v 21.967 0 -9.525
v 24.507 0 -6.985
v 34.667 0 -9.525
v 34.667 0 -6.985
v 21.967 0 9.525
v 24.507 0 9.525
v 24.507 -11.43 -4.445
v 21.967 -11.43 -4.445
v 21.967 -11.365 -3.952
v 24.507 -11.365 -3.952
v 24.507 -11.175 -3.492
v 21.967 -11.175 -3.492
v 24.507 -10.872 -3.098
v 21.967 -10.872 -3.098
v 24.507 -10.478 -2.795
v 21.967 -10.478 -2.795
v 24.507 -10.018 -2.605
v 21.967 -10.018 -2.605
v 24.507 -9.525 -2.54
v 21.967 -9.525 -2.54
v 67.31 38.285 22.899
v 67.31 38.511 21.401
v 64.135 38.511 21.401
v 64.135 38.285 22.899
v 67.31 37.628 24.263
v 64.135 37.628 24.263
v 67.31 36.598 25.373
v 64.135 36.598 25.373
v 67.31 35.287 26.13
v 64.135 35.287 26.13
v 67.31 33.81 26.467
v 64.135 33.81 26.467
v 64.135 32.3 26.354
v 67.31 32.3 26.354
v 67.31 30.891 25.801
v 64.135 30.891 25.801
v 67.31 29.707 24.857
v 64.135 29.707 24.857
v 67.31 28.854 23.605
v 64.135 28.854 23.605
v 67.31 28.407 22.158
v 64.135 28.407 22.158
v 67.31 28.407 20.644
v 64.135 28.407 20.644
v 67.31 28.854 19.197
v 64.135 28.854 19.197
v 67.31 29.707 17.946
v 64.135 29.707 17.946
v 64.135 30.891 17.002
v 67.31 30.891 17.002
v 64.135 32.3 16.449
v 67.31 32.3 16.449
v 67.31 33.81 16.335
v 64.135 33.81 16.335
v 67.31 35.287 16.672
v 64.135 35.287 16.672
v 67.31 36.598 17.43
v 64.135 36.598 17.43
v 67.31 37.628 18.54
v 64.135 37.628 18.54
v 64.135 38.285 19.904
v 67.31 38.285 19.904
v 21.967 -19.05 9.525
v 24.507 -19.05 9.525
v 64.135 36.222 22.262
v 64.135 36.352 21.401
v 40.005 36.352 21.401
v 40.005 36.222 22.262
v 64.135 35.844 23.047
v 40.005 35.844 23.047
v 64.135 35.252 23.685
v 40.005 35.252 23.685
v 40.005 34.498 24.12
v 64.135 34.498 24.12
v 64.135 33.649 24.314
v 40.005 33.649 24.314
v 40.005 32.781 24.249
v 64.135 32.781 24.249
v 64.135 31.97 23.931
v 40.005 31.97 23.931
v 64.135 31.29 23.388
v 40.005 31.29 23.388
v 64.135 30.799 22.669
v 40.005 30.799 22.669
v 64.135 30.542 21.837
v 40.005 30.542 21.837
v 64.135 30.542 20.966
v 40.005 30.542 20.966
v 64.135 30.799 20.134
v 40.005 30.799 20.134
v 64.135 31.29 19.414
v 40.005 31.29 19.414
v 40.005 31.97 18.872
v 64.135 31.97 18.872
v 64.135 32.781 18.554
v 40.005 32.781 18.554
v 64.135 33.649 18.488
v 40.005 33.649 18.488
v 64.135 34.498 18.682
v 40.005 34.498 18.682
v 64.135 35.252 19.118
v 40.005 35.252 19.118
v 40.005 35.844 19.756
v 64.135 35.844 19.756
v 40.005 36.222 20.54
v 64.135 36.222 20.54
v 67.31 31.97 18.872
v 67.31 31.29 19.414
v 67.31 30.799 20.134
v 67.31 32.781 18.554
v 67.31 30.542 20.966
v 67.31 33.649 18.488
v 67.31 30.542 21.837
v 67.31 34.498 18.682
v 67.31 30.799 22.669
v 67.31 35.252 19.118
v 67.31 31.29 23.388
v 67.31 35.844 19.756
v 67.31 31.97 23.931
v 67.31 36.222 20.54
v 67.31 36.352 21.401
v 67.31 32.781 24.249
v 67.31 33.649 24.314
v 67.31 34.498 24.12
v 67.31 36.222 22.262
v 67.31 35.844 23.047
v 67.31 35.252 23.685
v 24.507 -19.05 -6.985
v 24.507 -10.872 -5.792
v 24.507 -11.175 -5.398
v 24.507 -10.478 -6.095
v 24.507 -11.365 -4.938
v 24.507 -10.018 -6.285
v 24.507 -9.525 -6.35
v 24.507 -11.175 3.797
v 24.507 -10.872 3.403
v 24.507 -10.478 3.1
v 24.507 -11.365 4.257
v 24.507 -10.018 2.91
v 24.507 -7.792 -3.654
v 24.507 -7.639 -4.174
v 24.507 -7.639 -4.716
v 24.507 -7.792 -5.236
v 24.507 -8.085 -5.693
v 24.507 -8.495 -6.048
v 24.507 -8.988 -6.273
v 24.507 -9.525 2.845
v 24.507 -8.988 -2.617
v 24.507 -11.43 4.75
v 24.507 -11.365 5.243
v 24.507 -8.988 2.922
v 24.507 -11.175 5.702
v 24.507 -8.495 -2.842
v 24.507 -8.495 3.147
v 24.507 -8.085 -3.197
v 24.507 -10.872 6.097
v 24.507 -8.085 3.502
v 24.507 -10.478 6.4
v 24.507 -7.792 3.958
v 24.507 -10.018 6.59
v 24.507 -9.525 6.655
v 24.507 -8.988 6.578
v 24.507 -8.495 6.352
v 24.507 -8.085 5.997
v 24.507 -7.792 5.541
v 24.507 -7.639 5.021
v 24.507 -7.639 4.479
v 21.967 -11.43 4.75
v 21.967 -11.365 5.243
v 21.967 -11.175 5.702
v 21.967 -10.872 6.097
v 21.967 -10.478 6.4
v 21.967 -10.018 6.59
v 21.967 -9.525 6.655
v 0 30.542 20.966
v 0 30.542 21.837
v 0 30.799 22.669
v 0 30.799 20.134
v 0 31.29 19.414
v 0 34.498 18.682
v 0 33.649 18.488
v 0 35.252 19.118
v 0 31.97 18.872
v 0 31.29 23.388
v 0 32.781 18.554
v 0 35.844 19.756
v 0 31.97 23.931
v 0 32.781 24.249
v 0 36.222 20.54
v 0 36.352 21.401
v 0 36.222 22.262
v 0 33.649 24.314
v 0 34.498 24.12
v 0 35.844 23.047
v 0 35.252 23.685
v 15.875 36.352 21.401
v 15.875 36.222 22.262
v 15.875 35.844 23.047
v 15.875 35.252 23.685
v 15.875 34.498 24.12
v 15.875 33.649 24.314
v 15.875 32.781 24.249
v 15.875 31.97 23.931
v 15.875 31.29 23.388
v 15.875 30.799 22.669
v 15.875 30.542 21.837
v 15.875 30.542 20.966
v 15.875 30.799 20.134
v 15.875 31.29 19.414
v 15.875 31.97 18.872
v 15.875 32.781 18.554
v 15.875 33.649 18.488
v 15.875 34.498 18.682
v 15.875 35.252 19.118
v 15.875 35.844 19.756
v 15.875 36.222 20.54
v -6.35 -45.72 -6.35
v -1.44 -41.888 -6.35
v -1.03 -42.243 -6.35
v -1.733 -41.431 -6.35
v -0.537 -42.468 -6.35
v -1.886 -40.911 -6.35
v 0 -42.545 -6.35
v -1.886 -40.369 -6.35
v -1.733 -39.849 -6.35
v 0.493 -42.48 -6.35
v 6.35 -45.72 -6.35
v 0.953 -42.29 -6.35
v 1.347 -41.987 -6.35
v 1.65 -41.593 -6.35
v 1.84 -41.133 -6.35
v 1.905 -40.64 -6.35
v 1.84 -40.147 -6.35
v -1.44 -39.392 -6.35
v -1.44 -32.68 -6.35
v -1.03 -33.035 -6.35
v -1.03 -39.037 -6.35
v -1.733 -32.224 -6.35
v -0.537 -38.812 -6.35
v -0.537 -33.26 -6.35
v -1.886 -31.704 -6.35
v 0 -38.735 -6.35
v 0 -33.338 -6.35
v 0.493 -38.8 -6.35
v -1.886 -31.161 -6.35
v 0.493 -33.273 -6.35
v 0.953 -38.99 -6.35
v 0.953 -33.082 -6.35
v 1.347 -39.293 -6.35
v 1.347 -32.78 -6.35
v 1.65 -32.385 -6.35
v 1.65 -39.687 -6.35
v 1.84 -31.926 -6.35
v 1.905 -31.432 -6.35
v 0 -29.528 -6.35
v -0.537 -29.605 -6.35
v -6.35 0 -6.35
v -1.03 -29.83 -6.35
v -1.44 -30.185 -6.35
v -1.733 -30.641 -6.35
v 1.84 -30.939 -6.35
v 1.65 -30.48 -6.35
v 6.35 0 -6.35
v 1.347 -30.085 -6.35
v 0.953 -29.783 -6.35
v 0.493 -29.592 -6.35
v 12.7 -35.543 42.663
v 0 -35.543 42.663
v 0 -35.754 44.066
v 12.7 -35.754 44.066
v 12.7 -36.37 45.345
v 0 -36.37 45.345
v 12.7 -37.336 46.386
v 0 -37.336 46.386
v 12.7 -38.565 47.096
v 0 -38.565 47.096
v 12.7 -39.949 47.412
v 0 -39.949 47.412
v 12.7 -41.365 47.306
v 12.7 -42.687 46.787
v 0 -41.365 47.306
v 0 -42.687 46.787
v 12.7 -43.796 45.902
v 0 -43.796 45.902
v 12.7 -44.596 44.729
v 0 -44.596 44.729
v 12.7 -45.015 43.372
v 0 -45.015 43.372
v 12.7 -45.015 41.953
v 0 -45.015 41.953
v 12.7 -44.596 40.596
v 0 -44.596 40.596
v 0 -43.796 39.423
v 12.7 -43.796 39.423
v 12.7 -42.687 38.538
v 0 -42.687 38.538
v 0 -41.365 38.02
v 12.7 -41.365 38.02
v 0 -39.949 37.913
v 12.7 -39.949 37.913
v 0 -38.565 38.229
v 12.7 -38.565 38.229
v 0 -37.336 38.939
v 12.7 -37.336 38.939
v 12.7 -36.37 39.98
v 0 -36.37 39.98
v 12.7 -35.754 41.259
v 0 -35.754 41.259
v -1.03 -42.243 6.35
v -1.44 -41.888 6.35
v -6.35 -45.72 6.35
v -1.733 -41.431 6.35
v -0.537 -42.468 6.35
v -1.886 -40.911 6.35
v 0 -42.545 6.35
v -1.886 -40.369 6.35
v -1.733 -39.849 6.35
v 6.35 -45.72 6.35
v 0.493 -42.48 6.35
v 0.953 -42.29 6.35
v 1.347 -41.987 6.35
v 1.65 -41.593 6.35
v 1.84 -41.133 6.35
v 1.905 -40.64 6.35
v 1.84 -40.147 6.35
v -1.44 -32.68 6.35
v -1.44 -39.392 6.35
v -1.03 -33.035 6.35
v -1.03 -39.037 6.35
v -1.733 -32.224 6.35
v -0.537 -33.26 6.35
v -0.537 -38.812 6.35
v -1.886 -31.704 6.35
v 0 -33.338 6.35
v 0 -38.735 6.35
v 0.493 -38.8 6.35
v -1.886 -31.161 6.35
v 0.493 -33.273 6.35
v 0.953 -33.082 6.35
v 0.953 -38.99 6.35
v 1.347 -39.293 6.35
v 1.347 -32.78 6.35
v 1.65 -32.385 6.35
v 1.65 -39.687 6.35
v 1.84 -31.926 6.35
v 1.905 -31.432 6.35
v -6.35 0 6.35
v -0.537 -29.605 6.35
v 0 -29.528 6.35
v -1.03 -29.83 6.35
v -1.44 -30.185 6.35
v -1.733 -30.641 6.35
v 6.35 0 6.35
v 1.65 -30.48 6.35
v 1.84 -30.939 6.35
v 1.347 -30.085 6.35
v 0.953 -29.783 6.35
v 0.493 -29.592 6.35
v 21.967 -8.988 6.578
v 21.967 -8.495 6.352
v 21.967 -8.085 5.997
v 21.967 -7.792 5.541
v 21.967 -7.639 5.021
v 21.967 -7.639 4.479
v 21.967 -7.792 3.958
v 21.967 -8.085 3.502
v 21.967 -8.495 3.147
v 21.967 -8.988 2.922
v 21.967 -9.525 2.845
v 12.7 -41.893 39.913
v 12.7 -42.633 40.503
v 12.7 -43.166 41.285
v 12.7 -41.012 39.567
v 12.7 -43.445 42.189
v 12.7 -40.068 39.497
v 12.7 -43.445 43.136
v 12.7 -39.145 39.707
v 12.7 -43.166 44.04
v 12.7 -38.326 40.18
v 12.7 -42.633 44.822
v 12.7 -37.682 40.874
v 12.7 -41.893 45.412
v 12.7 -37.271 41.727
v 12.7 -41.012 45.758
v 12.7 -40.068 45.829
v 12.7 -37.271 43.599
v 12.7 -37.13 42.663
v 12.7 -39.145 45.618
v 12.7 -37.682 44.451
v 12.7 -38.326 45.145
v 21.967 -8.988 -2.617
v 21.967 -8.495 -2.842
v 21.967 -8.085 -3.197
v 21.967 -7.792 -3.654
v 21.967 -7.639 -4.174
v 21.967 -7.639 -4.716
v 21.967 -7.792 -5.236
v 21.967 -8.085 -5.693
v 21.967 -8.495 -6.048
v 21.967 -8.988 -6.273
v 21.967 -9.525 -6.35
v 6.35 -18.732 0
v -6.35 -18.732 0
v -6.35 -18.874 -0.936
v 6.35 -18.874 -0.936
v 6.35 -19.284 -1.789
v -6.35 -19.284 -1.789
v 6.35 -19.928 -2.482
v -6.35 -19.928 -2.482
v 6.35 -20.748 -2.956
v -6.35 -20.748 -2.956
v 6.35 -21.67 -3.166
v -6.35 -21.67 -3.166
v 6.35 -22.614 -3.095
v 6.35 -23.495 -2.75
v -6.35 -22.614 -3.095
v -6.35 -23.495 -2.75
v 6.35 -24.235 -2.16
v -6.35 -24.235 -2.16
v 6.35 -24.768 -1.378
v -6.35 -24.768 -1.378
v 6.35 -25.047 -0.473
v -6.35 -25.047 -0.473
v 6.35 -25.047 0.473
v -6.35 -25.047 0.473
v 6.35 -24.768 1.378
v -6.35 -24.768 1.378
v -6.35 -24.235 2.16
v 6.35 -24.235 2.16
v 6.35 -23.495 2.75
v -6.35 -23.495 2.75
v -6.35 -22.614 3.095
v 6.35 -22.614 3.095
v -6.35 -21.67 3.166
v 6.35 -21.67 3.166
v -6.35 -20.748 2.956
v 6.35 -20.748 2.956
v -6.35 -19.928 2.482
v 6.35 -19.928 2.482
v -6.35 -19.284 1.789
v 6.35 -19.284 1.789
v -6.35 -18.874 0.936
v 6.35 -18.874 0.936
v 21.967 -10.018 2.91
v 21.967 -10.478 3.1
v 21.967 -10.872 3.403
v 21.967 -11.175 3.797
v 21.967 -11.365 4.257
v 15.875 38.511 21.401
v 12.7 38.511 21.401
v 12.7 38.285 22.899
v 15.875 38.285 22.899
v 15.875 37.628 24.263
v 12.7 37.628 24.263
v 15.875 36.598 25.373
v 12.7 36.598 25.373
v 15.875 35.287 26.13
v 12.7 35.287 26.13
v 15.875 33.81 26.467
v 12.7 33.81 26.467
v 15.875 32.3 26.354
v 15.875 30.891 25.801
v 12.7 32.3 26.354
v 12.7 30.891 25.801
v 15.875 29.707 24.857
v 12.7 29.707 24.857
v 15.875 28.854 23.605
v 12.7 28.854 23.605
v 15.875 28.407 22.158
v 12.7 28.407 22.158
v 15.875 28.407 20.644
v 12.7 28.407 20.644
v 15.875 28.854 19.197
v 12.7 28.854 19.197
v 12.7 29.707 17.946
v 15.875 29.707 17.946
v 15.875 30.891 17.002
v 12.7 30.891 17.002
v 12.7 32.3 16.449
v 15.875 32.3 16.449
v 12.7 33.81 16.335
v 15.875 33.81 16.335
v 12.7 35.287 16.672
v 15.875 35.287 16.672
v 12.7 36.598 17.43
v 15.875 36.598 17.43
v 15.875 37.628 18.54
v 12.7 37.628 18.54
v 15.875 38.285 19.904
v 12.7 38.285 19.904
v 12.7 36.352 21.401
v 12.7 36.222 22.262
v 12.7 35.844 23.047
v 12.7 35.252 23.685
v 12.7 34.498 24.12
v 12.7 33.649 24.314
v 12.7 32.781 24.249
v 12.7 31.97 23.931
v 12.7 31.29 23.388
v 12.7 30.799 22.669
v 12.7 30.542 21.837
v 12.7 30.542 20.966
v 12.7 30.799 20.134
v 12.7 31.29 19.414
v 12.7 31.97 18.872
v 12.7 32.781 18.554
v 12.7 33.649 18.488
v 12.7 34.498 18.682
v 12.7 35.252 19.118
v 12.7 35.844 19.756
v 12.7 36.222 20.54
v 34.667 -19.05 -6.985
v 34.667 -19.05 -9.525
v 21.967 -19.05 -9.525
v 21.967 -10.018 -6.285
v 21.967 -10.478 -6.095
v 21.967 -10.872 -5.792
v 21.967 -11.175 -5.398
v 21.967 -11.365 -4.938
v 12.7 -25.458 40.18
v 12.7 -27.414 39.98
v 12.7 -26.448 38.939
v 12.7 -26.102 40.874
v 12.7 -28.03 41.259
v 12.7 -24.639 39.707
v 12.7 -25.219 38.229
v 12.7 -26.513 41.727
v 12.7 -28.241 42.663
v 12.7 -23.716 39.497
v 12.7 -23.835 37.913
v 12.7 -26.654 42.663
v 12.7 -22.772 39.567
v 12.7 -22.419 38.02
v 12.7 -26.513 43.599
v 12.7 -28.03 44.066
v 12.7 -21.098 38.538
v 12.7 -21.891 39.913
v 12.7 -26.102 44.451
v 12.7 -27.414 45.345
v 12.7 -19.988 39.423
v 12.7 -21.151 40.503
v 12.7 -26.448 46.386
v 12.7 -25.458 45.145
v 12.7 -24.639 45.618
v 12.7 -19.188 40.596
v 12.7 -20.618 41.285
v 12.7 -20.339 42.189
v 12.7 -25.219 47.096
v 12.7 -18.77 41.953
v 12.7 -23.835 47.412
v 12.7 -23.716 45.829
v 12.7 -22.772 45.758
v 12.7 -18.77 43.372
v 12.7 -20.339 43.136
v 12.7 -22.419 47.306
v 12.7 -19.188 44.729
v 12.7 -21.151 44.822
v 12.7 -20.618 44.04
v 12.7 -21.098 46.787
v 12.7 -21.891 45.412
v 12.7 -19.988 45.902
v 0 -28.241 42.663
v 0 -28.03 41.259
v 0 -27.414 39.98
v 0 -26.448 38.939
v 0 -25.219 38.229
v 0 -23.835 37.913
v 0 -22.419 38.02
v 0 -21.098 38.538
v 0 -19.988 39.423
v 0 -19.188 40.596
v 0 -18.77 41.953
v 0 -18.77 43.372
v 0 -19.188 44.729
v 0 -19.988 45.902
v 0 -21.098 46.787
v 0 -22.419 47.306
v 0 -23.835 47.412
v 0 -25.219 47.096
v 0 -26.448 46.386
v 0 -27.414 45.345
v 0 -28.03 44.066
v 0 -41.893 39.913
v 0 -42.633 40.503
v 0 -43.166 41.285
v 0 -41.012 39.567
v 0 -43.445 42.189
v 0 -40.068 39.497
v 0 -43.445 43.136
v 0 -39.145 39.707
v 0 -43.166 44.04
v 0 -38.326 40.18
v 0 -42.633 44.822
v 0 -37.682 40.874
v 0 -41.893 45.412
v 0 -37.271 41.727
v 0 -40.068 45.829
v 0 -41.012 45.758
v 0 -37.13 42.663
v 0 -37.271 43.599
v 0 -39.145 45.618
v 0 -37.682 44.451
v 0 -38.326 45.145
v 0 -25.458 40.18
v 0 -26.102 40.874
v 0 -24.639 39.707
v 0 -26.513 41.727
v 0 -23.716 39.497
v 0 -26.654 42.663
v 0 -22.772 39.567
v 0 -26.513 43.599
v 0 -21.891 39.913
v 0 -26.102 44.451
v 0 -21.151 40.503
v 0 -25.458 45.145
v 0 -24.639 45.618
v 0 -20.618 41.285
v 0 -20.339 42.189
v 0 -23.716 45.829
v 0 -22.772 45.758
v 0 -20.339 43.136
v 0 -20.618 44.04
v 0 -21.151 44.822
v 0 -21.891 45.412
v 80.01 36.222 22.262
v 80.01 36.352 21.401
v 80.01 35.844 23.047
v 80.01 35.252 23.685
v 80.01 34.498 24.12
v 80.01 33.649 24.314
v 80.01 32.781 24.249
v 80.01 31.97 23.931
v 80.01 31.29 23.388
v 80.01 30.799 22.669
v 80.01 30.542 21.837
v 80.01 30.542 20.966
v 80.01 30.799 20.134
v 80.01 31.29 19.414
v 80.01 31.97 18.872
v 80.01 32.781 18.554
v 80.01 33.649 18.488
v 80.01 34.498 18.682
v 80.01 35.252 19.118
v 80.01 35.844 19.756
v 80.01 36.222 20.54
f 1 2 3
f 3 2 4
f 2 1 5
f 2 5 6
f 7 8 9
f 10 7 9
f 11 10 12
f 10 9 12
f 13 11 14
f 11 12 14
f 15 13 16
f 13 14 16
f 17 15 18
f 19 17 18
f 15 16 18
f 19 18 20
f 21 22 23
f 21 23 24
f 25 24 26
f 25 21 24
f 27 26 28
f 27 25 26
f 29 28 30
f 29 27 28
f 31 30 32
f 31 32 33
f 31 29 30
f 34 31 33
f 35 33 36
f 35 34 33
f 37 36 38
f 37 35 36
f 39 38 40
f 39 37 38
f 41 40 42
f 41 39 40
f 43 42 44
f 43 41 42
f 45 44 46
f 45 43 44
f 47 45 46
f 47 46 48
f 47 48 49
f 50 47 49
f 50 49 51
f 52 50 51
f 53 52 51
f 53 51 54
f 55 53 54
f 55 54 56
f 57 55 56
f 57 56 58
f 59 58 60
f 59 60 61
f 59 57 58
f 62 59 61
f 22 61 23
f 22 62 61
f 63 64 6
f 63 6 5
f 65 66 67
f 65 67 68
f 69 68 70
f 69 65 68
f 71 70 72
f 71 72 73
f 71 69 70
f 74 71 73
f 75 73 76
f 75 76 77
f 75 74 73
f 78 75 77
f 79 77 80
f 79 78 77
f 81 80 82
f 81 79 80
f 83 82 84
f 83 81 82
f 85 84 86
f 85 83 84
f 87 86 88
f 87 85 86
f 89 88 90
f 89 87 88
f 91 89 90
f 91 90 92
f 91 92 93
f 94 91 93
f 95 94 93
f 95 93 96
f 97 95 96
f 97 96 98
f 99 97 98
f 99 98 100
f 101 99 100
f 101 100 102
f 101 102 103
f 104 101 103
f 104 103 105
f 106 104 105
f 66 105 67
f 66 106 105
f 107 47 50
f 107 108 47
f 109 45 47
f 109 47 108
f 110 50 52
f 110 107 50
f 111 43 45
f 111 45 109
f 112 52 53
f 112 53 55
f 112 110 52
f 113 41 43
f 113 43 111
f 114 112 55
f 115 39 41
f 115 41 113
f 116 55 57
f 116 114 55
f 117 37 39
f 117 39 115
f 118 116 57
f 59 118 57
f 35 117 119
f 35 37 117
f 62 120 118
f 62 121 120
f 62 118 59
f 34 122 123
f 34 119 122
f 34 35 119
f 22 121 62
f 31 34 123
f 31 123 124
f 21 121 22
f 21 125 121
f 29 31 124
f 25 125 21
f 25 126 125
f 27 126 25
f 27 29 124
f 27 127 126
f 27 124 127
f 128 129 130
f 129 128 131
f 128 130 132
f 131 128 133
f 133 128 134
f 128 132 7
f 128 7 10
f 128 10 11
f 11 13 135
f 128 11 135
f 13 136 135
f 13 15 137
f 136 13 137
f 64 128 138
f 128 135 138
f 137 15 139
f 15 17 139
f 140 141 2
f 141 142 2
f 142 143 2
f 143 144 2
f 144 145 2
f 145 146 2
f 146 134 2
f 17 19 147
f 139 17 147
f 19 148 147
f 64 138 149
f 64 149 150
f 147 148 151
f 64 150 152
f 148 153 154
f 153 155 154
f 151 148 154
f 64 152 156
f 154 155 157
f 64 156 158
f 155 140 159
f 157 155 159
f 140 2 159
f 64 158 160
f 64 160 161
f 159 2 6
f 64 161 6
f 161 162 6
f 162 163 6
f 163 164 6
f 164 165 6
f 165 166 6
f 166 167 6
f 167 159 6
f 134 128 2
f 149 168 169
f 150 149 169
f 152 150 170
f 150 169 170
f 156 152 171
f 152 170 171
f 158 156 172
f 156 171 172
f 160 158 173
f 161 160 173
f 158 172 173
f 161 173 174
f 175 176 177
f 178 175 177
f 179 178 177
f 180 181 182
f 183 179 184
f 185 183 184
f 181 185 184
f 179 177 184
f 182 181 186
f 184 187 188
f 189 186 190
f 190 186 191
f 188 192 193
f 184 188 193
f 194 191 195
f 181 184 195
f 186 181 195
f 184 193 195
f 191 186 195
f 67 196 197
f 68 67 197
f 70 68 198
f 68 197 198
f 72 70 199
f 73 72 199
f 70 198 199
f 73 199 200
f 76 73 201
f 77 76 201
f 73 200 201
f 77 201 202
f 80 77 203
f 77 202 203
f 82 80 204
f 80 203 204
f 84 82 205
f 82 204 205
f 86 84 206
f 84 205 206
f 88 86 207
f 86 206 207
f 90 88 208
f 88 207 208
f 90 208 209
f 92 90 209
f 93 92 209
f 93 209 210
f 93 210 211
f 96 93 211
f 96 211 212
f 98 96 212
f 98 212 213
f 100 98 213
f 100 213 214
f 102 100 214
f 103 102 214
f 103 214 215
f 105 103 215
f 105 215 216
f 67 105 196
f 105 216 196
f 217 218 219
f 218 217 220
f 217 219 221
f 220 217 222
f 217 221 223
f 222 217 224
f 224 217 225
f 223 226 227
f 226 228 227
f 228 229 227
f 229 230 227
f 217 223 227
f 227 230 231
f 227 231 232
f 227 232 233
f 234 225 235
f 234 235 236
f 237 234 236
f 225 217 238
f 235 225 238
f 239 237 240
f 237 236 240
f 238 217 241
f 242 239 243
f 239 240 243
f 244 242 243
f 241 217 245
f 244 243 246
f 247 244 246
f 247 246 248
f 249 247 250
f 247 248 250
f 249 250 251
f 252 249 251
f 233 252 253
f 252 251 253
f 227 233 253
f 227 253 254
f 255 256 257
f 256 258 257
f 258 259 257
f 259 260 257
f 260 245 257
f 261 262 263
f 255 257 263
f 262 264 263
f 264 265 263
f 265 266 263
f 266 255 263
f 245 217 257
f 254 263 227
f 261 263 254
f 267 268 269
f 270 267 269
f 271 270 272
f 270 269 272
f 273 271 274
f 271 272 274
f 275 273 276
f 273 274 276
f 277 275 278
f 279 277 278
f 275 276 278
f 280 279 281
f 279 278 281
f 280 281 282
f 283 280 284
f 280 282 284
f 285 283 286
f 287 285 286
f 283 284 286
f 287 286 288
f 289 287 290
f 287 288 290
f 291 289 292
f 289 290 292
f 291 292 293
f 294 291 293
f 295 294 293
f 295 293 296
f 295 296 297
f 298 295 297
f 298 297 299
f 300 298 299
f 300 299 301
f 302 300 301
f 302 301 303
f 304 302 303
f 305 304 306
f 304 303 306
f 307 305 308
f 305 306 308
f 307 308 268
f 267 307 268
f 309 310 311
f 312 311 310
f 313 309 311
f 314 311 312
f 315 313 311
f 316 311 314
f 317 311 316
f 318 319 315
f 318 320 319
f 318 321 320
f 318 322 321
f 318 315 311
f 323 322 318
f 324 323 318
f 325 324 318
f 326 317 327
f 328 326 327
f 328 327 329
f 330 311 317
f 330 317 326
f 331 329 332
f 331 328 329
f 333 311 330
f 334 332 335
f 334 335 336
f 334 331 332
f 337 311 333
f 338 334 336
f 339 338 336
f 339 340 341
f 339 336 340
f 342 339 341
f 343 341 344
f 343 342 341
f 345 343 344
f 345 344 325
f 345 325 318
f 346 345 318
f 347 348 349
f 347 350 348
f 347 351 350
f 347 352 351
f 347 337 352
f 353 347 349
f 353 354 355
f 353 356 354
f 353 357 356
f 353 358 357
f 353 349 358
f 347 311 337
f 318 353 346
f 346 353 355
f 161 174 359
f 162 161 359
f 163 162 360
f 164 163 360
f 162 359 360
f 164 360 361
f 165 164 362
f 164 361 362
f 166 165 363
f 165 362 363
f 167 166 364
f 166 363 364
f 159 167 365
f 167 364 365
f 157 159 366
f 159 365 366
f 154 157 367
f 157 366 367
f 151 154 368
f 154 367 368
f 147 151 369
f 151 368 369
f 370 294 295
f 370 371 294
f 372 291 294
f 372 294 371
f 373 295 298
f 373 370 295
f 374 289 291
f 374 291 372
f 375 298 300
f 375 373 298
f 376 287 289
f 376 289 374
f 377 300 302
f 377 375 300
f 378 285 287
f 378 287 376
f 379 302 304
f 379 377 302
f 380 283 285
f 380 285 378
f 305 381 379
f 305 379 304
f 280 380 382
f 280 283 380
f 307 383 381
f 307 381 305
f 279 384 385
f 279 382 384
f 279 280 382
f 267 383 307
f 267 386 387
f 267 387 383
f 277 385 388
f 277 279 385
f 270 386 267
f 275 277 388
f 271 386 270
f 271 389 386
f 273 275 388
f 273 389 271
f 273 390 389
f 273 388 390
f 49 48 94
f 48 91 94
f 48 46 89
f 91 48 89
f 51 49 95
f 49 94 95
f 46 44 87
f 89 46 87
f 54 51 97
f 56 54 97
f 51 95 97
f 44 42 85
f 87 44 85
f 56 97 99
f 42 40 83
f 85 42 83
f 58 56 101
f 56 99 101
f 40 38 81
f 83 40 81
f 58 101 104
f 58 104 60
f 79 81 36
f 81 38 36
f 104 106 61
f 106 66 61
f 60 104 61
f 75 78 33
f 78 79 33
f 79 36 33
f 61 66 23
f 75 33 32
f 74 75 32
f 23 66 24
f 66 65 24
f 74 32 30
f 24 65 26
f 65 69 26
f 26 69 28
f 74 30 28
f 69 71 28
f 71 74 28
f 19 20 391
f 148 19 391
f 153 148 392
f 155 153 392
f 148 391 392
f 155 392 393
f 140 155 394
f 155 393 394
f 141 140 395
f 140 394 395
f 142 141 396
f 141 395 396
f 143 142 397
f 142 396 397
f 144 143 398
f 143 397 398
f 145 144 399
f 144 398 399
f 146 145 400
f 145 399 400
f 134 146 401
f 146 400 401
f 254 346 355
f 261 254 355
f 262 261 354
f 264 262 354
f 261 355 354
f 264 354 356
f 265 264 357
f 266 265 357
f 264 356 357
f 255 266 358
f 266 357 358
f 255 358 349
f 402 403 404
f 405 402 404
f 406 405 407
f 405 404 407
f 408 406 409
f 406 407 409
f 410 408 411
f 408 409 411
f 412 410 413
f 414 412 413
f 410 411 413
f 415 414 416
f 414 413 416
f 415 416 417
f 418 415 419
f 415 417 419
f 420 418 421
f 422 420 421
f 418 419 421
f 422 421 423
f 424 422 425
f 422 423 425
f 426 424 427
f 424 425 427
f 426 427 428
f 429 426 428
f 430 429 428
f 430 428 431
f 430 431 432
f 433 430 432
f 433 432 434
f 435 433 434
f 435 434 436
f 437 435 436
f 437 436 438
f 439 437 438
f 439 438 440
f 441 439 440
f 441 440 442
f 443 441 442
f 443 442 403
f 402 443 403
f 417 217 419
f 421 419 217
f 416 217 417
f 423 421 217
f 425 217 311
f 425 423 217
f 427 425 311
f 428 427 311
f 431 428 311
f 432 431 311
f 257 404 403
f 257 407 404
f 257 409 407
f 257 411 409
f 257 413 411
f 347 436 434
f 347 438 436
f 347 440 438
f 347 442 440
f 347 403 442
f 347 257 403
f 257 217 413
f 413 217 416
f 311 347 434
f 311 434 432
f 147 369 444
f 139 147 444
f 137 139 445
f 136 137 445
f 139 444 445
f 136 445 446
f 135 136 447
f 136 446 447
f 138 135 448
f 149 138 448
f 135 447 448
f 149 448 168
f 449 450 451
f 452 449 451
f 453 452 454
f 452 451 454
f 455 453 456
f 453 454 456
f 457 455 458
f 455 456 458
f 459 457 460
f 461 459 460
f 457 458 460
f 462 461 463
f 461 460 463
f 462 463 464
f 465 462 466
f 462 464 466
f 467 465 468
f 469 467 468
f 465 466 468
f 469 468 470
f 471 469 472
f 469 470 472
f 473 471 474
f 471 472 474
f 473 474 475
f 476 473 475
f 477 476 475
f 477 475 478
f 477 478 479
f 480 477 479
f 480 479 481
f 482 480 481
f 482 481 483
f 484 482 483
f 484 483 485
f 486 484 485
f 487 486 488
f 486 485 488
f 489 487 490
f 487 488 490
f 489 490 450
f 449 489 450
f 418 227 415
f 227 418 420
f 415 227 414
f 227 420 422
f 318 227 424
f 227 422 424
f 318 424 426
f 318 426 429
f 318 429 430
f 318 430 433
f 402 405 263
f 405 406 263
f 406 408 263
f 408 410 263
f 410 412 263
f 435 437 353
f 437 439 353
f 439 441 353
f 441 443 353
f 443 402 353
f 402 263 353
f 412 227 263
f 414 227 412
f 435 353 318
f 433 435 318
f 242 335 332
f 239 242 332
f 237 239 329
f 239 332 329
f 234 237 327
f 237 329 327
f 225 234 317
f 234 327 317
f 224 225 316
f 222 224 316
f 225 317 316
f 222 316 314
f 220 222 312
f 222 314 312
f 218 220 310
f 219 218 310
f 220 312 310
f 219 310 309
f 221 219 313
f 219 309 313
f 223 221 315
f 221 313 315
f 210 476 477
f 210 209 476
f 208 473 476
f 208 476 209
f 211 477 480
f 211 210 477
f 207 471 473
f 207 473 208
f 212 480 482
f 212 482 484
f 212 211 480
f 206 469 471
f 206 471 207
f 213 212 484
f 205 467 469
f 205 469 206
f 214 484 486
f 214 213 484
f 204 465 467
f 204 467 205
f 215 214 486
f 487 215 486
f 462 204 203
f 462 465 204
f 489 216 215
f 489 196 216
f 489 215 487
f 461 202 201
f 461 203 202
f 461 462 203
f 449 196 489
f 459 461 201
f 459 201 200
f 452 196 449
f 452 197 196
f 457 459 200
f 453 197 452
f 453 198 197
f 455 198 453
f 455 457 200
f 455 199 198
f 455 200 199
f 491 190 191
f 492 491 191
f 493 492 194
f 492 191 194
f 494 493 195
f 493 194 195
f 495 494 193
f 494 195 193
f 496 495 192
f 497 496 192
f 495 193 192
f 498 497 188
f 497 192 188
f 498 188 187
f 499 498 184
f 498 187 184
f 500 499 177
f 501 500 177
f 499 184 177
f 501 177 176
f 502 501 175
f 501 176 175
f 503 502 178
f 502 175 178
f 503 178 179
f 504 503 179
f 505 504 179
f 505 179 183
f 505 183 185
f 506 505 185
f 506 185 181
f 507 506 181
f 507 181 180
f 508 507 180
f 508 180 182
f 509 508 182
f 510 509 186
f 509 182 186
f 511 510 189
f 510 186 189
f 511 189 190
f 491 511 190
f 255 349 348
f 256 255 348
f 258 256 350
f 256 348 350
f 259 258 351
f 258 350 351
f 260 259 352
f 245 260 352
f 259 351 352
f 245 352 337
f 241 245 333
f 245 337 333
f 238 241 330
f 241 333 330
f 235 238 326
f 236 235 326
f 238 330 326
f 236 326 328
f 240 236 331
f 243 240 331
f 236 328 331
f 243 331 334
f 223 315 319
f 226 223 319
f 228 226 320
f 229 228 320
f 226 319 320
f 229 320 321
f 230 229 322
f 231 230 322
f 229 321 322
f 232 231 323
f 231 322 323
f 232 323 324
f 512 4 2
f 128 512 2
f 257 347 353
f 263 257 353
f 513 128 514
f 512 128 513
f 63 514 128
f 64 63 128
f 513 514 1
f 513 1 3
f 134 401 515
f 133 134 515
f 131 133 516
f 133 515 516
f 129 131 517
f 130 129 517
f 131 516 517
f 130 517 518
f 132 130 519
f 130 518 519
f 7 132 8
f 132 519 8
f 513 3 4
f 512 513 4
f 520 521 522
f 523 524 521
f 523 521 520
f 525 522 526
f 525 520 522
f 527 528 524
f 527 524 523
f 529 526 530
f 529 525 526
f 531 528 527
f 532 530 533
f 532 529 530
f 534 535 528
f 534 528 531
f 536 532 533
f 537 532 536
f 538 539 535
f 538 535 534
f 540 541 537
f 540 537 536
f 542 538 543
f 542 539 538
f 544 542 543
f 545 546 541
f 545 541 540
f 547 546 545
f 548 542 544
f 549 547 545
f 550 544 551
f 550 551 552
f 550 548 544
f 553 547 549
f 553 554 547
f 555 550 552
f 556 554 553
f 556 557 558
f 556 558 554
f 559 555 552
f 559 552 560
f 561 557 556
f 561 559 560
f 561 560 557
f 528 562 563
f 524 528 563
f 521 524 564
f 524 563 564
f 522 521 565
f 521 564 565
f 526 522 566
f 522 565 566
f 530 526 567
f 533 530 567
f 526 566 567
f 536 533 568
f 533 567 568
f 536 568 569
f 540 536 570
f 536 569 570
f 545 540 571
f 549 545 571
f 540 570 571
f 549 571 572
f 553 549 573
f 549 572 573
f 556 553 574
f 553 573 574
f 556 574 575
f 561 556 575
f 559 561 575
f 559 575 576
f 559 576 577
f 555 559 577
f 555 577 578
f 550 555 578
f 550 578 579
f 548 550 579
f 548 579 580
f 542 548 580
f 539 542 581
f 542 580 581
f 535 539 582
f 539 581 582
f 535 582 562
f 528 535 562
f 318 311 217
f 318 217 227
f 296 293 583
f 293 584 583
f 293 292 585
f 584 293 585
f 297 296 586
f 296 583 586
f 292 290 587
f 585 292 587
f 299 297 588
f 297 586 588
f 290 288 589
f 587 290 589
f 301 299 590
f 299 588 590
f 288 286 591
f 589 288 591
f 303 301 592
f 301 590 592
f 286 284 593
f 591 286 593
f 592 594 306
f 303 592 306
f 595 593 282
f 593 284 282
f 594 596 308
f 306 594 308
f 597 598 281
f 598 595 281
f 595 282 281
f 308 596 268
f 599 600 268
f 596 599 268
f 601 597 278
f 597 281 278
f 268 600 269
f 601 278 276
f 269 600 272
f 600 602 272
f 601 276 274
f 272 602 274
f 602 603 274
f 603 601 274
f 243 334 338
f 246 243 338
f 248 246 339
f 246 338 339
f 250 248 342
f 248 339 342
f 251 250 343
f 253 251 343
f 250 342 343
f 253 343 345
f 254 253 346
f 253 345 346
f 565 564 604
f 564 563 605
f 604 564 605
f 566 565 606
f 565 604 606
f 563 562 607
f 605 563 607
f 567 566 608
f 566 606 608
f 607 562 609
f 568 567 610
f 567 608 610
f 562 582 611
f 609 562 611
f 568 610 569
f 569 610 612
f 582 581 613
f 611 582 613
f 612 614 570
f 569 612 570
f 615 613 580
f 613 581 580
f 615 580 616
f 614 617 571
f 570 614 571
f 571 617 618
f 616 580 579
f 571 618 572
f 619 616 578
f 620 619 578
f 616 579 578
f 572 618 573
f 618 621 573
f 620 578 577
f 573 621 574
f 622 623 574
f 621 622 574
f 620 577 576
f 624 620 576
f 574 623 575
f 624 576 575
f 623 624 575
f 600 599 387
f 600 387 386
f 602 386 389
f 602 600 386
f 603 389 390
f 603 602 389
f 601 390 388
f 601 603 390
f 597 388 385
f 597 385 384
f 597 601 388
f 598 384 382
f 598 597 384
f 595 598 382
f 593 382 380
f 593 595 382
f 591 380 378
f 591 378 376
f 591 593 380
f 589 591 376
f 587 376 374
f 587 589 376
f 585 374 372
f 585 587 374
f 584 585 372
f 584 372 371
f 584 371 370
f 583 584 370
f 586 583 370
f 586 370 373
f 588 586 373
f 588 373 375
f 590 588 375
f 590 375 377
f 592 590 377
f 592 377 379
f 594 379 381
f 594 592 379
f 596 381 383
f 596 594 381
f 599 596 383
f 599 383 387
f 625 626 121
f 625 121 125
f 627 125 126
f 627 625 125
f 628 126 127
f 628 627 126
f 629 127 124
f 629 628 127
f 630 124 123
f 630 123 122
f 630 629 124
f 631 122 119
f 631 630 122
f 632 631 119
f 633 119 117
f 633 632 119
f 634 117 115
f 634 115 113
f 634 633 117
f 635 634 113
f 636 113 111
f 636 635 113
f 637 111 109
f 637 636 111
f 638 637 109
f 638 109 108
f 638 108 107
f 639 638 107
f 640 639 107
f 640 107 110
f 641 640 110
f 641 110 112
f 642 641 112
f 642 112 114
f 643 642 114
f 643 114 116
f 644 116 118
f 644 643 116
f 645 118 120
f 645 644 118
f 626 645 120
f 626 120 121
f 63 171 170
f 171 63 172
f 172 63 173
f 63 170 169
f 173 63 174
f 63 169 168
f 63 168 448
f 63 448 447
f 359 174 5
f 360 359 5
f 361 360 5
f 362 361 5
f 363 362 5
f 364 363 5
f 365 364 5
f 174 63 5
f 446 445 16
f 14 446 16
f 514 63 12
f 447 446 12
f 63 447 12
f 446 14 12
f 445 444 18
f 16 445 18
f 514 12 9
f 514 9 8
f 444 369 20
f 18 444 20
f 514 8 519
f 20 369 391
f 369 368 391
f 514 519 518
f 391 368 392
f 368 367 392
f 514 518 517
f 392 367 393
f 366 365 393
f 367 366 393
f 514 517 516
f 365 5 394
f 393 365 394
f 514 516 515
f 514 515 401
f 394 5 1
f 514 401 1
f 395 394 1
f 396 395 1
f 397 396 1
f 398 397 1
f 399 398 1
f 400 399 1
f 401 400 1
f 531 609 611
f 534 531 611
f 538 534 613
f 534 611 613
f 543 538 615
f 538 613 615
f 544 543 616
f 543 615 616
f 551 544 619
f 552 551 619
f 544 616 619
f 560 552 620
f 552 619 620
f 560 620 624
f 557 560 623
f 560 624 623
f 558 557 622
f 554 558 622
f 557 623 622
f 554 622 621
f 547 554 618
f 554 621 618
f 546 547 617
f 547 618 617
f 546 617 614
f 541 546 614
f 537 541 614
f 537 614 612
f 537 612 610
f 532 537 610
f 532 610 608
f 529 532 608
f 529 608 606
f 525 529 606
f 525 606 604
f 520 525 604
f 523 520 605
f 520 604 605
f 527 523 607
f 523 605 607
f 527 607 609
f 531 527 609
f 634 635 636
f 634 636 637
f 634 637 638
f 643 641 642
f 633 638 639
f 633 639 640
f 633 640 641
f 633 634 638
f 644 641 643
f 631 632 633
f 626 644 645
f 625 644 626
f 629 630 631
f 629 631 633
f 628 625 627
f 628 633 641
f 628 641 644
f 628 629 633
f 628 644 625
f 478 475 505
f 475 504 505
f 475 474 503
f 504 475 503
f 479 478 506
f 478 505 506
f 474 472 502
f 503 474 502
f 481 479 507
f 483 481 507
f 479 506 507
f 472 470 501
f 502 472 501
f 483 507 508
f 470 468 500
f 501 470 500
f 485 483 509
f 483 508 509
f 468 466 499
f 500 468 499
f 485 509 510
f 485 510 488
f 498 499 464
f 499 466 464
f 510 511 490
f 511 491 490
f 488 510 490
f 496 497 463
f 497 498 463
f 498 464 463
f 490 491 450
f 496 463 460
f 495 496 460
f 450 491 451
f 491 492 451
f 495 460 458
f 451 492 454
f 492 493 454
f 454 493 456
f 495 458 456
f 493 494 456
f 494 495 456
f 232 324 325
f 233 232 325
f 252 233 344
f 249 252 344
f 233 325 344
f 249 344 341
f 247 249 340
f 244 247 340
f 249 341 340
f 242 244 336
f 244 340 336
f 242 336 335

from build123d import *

# Parameters (mm, degrees)
F0_W      = 12.7
F0_H      = 12.7
F1_DEPTH  = 45.72
F2_DEPTH  = 19.05
F4_DEPTH  = 25.4
F6_DEPTH  = 25.4
F8_DEPTH  = 25.4
F9_R      = 4.7625
F9_R_2    = 3.175
F10_DEPTH = 12.7
F11_R     = 2.921
F12_DEPTH = 12.7
F13_R     = 5.08
F14_DEPTH = 3.175
F15_R     = 2.921
F16_DEPTH = 24.13


with BuildPart() as f1:
    # F0 (on Front) → F1 (new body)
    with BuildSketch(Plane.XZ):
        Rectangle(F0_W, F0_H)
    extrude(amount=F1_DEPTH)

    # F5 (on face) → F6 (cut)
    with BuildSketch(Plane.XY.offset(6.35)):
        with BuildLine():
            ThreePointArc((0, -38.735), (-1.905, -40.64), (0, -42.545))
            Line((0, -42.545), (0, -38.735))
        make_face()
        with BuildLine():
            ThreePointArc((0, -29.5275), (-1.905, -31.4325), (0, -33.3375))
            Line((0, -33.3375), (0, -29.5275))
        make_face()
        with BuildLine():
            Line((0, -29.5275), (0, -33.3375))
            ThreePointArc((0, -33.3375), (1.3470384182, -32.7795384182), (1.905, -31.4325))
            ThreePointArc((1.905, -31.4325), (1.3470384182, -30.0854615818), (0, -29.5275))
        make_face()
        with BuildLine():
            Line((0, -38.735), (0, -42.545))
            ThreePointArc((0, -42.545), (1.3470384182, -41.9870384182), (1.905, -40.64))
            ThreePointArc((1.905, -40.64), (1.3470384182, -39.2929615818), (0, -38.735))
        make_face()
    extrude(amount=-F6_DEPTH, mode=Mode.SUBTRACT)

    # F7 (on face) → F8 (cut)
    with BuildSketch(Plane(origin=(-6.35, 0, 0), x_dir=(0, -1, 0), z_dir=(-1, 0, 0))):
        with BuildLine():
            ThreePointArc((25.0825, 0), (21.9075, 3.175), (18.7325, 0))
            Line((18.7325, 0), (25.0825, 0))
        make_face()
        with BuildLine():
            Line((25.0825, 0), (18.7325, 0))
            ThreePointArc((18.7325, 0), (21.9075, -3.175), (25.0825, 0))
        make_face()
    extrude(amount=-F8_DEPTH, mode=Mode.SUBTRACT)


with BuildPart() as f2:
    # F0 (on Front) → F2 (new body)
    with BuildSketch(Plane.XZ):
        Polygon((24.5067921007, 9.525), (21.9667921007, 9.525), (21.9667921007, -9.525), (34.6667921007, -9.525), (34.6667921007, -6.985), (24.5067921007, -6.985), align=None)
    extrude(amount=F2_DEPTH)

    # F3 (on face) → F4 (cut)
    with BuildSketch(Plane(origin=(21.9667921007, 0, 0), x_dir=(0, -1, 0), z_dir=(-1, 0, 0))):
        with BuildLine():
            ThreePointArc((11.43, 4.7498), (10.8720384182, 6.0968384182), (9.525, 6.6548))
            Line((9.525, 6.6548), (9.525, 2.8448))
            ThreePointArc((9.525, 2.8448), (10.8720384182, 3.4027615818), (11.43, 4.7498))
        make_face()
        with BuildLine():
            ThreePointArc((11.43, -4.445), (10.8720384182, -3.0979615818), (9.525, -2.54))
            Line((9.525, -2.54), (9.525, -6.35))
            ThreePointArc((9.525, -6.35), (10.8720384182, -5.7920384182), (11.43, -4.445))
        make_face()
        with BuildLine():
            Line((9.525, -6.35), (9.525, -2.54))
            ThreePointArc((9.525, -2.54), (7.62, -4.445), (9.525, -6.35))
        make_face()
        with BuildLine():
            Line((9.525, 2.8448), (9.525, 6.6548))
            ThreePointArc((9.525, 6.6548), (7.62, 4.7498), (9.525, 2.8448))
        make_face()
    extrude(amount=-F4_DEPTH, mode=Mode.SUBTRACT)


with BuildPart() as f10:
    # F9 (on Right) → F10 (new body)
    with BuildSketch(Plane.YZ):
        with Locations((-40.3053197099, 42.6626764238)):
            Circle(F9_R)
        with Locations((-40.3053197099, 42.6626764238)):
            Circle(F9_R_2, mode=Mode.SUBTRACT)
    extrude(amount=F10_DEPTH)


with BuildPart() as f10b:
    # F9 (on Right) → F10, piece 2 (new body)
    with BuildSketch(Plane.YZ):
        with BuildLine():
            ThreePointArc((-18.7163754003, 42.6626764238), (-23.4788754003, 47.4251764238), (-28.2413754003, 42.6626764238))
            ThreePointArc((-28.2413754003, 42.6626764238), (-23.4788754003, 37.9001764238), (-18.7163754003, 42.6626764238))
        make_face()
        with BuildLine():
            ThreePointArc((-20.3038754003, 42.6626764238), (-23.4788754003, 39.4876764238), (-26.6538754003, 42.6626764238))
            ThreePointArc((-26.6538754003, 42.6626764238), (-23.4788754003, 45.8376764238), (-20.3038754003, 42.6626764238))
        make_face(mode=Mode.SUBTRACT)
    extrude(amount=F10_DEPTH)


with BuildPart() as f12:
    # F11 (on Right) → F12 (new body)
    with BuildSketch(Plane.YZ):
        with Locations((33.4307514131, 21.401276812)):
            Circle(F11_R)
    extrude(amount=F12_DEPTH)

    # F13 (on face) → F14 (join)
    with BuildSketch(Plane.YZ.offset(12.7)):
        with Locations((33.4307514131, 21.401276812)):
            Circle(F13_R)
    extrude(amount=F14_DEPTH)

    # F15 (on face) → F16 (join)
    with BuildSketch(Plane.YZ.offset(15.875)):
        with Locations((33.4307514131, 21.401276812)):
            Circle(F15_R)
    extrude(amount=F16_DEPTH)

    # F17: F12 across face


with BuildPart() as f12_1:
    add(f12.part)
    add(f12.part.mirror(Plane(origin=(40.005, 33.4307514131, 21.401276812), x_dir=(0, 1, 0), z_dir=(1, 0, 0))))


solid = Compound([f1.part, f2.part, f10.part, f10b.part, f12_1.part])
